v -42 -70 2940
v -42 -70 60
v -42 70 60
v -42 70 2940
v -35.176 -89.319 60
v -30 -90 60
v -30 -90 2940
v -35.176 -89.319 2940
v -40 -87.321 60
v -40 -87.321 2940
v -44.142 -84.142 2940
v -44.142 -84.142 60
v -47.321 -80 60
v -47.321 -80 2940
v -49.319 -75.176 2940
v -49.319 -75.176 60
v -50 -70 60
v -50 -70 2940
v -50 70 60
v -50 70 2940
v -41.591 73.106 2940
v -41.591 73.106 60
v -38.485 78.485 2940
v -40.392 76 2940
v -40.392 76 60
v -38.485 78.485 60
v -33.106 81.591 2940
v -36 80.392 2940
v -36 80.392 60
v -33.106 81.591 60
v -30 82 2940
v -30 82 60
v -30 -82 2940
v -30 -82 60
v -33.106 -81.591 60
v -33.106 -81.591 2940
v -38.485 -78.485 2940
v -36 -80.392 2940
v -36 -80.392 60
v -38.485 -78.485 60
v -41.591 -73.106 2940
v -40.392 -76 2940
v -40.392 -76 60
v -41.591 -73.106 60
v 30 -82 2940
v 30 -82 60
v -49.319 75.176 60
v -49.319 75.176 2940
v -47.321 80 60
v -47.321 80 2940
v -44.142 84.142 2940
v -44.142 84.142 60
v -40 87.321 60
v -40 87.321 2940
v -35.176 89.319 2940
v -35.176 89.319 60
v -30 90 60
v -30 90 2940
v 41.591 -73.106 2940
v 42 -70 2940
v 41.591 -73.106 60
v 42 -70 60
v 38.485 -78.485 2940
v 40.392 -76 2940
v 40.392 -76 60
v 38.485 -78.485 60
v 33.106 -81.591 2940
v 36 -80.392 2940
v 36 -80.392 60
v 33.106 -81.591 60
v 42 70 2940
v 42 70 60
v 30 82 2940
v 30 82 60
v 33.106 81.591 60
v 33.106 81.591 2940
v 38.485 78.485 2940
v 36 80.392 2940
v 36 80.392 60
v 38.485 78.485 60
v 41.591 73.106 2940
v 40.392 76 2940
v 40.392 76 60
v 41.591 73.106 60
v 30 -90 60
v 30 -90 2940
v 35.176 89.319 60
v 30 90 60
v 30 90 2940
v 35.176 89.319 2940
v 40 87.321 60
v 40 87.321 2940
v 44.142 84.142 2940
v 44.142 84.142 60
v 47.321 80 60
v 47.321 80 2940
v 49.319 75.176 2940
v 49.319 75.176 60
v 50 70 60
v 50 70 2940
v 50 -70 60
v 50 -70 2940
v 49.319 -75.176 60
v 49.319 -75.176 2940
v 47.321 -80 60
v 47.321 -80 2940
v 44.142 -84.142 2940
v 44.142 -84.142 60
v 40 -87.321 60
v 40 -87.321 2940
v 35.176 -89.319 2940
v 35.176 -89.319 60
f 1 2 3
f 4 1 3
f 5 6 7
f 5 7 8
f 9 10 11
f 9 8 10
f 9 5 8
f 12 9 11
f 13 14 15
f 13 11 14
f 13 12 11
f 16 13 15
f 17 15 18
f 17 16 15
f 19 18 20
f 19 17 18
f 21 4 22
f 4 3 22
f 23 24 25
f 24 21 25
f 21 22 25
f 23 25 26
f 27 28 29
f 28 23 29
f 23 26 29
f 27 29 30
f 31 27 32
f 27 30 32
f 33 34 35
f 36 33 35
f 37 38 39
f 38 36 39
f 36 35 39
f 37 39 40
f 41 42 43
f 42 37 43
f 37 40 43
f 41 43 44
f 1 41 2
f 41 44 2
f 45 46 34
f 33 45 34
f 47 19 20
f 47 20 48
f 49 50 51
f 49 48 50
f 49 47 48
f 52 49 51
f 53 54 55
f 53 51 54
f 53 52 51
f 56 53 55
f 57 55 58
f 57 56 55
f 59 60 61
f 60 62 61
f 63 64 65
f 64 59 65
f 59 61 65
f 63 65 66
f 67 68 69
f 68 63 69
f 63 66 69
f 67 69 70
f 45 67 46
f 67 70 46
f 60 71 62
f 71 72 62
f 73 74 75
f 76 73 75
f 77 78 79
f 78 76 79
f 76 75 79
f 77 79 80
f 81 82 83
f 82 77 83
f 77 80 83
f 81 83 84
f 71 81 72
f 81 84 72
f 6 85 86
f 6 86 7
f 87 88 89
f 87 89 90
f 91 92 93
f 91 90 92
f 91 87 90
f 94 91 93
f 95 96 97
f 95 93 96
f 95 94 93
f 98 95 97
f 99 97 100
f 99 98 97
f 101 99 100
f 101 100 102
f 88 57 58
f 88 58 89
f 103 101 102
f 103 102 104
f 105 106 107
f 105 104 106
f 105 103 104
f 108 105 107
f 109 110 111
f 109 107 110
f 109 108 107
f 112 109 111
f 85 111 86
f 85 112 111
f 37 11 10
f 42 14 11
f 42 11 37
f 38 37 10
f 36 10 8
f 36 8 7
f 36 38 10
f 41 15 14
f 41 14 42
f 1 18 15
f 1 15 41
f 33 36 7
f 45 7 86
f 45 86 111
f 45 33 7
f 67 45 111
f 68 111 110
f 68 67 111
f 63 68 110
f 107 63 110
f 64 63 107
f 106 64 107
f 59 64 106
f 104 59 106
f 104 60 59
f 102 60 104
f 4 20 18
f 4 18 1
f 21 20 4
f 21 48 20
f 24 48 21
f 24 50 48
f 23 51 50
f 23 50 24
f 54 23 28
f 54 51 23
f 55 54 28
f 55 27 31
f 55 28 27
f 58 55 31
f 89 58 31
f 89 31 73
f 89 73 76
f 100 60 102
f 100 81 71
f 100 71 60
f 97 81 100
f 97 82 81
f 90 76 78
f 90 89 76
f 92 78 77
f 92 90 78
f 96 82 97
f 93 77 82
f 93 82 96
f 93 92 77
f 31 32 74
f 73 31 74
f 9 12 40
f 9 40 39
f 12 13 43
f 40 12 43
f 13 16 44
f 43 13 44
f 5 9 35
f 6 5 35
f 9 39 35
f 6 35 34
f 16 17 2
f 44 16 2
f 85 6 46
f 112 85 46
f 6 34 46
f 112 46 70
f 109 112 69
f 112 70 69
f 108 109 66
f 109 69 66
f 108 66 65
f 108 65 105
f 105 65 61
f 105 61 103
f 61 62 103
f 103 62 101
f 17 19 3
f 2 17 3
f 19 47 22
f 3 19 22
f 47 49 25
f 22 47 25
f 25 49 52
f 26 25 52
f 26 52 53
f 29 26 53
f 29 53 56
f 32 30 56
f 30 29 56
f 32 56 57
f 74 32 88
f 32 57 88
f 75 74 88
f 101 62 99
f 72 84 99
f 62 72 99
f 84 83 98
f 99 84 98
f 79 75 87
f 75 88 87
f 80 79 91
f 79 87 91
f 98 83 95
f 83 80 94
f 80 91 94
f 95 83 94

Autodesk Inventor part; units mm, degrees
ref_plane "Start Plane" through (0, 0, 60) normal (0, 0, 1) x (1, 0, 0)
ref_plane "End Plane" through (0, 0, 2940) normal (0, 0, 1) x (1, 0, 0)
sketch "Sketch" plane through (0, 0, 0) normal (0, 0, 1) x (1, 0, 0)
  line L0 (-50, -70) -> (-50, 70)
  line L1 (-30, 90) -> (30, 90)
  line L2 (50, 70) -> (50, -70)
  line L3 (30, -90) -> (-30, -90)
  arc A0 (-50, -70) -> (-30, -90) centre (-30, -70) ccw
  arc A1 (50, 70) -> (30, 90) centre (30, 70) ccw
  arc A2 (-30, 90) -> (-50, 70) centre (-30, 70) ccw
  arc A3 (30, -90) -> (50, -70) centre (30, -70) ccw
  arc A4 (-30, 82) -> (-42, 70) centre (-30, 70) ccw
  line L4 (-30, 82) -> (30, 82)
  arc A5 (42, 70) -> (30, 82) centre (30, 70) ccw
  line L5 (42, 70) -> (42, -70)
  arc A6 (30, -82) -> (42, -70) centre (30, -70) ccw
  line L6 (30, -82) -> (-30, -82)
  arc A7 (-42, -70) -> (-30, -82) centre (-30, -70) ccw
  line L7 (-42, -70) -> (-42, 70)
  line L8 (0, 131.799) -> (0, -131.799) construction
  line L9 (-75.799, 0) -> (75.799, 0) construction
  dimension "d7" = 20
  dimension "d9" = 100
  dimension "d11" = 180
  dimension "d12" = 8
  dimension "d15" = 50
  dimension "d16" = 90
extrude "Body" add sketch "Sketch" along normal up to surface (2880 mm away) from surface at 60
sketch "Sketch3" plane through (0, 0, 0) normal (0, 0, 1) x (1, 0, 0)
  line L0 (0, 0) -> (10, 0)
ref_plane "Work Plane3" through (0, 0, 0) normal (0, -1, 0) x (1, 0, 0)
ref_plane "Work Plane4" through (50, -1200, 60) normal (0, 0, -1) x (-1, 0, 0)
split "Split1" plane through (50, -1200, 60) removes the side toward (0, 0, -1)
ref_plane "Work Plane5" through (-50, -1200, 2940) normal (0, 0, 1) x (1, 0, 0)
split "Split2" plane through (-50, -1200, 2940) removes the side toward (0, 0, 1)
sketch "Sketch4" plane through (0, 0, 0) normal (0, -1, 0) x (1, 0, 0)
  line L0 (-2, 60) -> (12, 60) projected
  line L1 (-2, 2940) -> (12, 2940) projected
  dimension "d18" = 2880
equation "\"d7\" = G_IR"
equation "\"d9\" = G_W"
equation "\"d11\" = G_H"
equation "\"d12\" = G_T"
equation "\"d15\" = 0.5 * d9"
equation "\"d16\" = 0.5 * d11"
equation "\"d3\" = G_L"
equation "\"G_W\" = 100"
equation "\"G_H\" = 180"
equation "\"G_T\" = 8"
equation "\"G_IR\" = 20"
equation "\"G_L\" = d18"
properties part number "ISO 10799-2 - 180x100x8 - 2880" material "Steel, Mild"
